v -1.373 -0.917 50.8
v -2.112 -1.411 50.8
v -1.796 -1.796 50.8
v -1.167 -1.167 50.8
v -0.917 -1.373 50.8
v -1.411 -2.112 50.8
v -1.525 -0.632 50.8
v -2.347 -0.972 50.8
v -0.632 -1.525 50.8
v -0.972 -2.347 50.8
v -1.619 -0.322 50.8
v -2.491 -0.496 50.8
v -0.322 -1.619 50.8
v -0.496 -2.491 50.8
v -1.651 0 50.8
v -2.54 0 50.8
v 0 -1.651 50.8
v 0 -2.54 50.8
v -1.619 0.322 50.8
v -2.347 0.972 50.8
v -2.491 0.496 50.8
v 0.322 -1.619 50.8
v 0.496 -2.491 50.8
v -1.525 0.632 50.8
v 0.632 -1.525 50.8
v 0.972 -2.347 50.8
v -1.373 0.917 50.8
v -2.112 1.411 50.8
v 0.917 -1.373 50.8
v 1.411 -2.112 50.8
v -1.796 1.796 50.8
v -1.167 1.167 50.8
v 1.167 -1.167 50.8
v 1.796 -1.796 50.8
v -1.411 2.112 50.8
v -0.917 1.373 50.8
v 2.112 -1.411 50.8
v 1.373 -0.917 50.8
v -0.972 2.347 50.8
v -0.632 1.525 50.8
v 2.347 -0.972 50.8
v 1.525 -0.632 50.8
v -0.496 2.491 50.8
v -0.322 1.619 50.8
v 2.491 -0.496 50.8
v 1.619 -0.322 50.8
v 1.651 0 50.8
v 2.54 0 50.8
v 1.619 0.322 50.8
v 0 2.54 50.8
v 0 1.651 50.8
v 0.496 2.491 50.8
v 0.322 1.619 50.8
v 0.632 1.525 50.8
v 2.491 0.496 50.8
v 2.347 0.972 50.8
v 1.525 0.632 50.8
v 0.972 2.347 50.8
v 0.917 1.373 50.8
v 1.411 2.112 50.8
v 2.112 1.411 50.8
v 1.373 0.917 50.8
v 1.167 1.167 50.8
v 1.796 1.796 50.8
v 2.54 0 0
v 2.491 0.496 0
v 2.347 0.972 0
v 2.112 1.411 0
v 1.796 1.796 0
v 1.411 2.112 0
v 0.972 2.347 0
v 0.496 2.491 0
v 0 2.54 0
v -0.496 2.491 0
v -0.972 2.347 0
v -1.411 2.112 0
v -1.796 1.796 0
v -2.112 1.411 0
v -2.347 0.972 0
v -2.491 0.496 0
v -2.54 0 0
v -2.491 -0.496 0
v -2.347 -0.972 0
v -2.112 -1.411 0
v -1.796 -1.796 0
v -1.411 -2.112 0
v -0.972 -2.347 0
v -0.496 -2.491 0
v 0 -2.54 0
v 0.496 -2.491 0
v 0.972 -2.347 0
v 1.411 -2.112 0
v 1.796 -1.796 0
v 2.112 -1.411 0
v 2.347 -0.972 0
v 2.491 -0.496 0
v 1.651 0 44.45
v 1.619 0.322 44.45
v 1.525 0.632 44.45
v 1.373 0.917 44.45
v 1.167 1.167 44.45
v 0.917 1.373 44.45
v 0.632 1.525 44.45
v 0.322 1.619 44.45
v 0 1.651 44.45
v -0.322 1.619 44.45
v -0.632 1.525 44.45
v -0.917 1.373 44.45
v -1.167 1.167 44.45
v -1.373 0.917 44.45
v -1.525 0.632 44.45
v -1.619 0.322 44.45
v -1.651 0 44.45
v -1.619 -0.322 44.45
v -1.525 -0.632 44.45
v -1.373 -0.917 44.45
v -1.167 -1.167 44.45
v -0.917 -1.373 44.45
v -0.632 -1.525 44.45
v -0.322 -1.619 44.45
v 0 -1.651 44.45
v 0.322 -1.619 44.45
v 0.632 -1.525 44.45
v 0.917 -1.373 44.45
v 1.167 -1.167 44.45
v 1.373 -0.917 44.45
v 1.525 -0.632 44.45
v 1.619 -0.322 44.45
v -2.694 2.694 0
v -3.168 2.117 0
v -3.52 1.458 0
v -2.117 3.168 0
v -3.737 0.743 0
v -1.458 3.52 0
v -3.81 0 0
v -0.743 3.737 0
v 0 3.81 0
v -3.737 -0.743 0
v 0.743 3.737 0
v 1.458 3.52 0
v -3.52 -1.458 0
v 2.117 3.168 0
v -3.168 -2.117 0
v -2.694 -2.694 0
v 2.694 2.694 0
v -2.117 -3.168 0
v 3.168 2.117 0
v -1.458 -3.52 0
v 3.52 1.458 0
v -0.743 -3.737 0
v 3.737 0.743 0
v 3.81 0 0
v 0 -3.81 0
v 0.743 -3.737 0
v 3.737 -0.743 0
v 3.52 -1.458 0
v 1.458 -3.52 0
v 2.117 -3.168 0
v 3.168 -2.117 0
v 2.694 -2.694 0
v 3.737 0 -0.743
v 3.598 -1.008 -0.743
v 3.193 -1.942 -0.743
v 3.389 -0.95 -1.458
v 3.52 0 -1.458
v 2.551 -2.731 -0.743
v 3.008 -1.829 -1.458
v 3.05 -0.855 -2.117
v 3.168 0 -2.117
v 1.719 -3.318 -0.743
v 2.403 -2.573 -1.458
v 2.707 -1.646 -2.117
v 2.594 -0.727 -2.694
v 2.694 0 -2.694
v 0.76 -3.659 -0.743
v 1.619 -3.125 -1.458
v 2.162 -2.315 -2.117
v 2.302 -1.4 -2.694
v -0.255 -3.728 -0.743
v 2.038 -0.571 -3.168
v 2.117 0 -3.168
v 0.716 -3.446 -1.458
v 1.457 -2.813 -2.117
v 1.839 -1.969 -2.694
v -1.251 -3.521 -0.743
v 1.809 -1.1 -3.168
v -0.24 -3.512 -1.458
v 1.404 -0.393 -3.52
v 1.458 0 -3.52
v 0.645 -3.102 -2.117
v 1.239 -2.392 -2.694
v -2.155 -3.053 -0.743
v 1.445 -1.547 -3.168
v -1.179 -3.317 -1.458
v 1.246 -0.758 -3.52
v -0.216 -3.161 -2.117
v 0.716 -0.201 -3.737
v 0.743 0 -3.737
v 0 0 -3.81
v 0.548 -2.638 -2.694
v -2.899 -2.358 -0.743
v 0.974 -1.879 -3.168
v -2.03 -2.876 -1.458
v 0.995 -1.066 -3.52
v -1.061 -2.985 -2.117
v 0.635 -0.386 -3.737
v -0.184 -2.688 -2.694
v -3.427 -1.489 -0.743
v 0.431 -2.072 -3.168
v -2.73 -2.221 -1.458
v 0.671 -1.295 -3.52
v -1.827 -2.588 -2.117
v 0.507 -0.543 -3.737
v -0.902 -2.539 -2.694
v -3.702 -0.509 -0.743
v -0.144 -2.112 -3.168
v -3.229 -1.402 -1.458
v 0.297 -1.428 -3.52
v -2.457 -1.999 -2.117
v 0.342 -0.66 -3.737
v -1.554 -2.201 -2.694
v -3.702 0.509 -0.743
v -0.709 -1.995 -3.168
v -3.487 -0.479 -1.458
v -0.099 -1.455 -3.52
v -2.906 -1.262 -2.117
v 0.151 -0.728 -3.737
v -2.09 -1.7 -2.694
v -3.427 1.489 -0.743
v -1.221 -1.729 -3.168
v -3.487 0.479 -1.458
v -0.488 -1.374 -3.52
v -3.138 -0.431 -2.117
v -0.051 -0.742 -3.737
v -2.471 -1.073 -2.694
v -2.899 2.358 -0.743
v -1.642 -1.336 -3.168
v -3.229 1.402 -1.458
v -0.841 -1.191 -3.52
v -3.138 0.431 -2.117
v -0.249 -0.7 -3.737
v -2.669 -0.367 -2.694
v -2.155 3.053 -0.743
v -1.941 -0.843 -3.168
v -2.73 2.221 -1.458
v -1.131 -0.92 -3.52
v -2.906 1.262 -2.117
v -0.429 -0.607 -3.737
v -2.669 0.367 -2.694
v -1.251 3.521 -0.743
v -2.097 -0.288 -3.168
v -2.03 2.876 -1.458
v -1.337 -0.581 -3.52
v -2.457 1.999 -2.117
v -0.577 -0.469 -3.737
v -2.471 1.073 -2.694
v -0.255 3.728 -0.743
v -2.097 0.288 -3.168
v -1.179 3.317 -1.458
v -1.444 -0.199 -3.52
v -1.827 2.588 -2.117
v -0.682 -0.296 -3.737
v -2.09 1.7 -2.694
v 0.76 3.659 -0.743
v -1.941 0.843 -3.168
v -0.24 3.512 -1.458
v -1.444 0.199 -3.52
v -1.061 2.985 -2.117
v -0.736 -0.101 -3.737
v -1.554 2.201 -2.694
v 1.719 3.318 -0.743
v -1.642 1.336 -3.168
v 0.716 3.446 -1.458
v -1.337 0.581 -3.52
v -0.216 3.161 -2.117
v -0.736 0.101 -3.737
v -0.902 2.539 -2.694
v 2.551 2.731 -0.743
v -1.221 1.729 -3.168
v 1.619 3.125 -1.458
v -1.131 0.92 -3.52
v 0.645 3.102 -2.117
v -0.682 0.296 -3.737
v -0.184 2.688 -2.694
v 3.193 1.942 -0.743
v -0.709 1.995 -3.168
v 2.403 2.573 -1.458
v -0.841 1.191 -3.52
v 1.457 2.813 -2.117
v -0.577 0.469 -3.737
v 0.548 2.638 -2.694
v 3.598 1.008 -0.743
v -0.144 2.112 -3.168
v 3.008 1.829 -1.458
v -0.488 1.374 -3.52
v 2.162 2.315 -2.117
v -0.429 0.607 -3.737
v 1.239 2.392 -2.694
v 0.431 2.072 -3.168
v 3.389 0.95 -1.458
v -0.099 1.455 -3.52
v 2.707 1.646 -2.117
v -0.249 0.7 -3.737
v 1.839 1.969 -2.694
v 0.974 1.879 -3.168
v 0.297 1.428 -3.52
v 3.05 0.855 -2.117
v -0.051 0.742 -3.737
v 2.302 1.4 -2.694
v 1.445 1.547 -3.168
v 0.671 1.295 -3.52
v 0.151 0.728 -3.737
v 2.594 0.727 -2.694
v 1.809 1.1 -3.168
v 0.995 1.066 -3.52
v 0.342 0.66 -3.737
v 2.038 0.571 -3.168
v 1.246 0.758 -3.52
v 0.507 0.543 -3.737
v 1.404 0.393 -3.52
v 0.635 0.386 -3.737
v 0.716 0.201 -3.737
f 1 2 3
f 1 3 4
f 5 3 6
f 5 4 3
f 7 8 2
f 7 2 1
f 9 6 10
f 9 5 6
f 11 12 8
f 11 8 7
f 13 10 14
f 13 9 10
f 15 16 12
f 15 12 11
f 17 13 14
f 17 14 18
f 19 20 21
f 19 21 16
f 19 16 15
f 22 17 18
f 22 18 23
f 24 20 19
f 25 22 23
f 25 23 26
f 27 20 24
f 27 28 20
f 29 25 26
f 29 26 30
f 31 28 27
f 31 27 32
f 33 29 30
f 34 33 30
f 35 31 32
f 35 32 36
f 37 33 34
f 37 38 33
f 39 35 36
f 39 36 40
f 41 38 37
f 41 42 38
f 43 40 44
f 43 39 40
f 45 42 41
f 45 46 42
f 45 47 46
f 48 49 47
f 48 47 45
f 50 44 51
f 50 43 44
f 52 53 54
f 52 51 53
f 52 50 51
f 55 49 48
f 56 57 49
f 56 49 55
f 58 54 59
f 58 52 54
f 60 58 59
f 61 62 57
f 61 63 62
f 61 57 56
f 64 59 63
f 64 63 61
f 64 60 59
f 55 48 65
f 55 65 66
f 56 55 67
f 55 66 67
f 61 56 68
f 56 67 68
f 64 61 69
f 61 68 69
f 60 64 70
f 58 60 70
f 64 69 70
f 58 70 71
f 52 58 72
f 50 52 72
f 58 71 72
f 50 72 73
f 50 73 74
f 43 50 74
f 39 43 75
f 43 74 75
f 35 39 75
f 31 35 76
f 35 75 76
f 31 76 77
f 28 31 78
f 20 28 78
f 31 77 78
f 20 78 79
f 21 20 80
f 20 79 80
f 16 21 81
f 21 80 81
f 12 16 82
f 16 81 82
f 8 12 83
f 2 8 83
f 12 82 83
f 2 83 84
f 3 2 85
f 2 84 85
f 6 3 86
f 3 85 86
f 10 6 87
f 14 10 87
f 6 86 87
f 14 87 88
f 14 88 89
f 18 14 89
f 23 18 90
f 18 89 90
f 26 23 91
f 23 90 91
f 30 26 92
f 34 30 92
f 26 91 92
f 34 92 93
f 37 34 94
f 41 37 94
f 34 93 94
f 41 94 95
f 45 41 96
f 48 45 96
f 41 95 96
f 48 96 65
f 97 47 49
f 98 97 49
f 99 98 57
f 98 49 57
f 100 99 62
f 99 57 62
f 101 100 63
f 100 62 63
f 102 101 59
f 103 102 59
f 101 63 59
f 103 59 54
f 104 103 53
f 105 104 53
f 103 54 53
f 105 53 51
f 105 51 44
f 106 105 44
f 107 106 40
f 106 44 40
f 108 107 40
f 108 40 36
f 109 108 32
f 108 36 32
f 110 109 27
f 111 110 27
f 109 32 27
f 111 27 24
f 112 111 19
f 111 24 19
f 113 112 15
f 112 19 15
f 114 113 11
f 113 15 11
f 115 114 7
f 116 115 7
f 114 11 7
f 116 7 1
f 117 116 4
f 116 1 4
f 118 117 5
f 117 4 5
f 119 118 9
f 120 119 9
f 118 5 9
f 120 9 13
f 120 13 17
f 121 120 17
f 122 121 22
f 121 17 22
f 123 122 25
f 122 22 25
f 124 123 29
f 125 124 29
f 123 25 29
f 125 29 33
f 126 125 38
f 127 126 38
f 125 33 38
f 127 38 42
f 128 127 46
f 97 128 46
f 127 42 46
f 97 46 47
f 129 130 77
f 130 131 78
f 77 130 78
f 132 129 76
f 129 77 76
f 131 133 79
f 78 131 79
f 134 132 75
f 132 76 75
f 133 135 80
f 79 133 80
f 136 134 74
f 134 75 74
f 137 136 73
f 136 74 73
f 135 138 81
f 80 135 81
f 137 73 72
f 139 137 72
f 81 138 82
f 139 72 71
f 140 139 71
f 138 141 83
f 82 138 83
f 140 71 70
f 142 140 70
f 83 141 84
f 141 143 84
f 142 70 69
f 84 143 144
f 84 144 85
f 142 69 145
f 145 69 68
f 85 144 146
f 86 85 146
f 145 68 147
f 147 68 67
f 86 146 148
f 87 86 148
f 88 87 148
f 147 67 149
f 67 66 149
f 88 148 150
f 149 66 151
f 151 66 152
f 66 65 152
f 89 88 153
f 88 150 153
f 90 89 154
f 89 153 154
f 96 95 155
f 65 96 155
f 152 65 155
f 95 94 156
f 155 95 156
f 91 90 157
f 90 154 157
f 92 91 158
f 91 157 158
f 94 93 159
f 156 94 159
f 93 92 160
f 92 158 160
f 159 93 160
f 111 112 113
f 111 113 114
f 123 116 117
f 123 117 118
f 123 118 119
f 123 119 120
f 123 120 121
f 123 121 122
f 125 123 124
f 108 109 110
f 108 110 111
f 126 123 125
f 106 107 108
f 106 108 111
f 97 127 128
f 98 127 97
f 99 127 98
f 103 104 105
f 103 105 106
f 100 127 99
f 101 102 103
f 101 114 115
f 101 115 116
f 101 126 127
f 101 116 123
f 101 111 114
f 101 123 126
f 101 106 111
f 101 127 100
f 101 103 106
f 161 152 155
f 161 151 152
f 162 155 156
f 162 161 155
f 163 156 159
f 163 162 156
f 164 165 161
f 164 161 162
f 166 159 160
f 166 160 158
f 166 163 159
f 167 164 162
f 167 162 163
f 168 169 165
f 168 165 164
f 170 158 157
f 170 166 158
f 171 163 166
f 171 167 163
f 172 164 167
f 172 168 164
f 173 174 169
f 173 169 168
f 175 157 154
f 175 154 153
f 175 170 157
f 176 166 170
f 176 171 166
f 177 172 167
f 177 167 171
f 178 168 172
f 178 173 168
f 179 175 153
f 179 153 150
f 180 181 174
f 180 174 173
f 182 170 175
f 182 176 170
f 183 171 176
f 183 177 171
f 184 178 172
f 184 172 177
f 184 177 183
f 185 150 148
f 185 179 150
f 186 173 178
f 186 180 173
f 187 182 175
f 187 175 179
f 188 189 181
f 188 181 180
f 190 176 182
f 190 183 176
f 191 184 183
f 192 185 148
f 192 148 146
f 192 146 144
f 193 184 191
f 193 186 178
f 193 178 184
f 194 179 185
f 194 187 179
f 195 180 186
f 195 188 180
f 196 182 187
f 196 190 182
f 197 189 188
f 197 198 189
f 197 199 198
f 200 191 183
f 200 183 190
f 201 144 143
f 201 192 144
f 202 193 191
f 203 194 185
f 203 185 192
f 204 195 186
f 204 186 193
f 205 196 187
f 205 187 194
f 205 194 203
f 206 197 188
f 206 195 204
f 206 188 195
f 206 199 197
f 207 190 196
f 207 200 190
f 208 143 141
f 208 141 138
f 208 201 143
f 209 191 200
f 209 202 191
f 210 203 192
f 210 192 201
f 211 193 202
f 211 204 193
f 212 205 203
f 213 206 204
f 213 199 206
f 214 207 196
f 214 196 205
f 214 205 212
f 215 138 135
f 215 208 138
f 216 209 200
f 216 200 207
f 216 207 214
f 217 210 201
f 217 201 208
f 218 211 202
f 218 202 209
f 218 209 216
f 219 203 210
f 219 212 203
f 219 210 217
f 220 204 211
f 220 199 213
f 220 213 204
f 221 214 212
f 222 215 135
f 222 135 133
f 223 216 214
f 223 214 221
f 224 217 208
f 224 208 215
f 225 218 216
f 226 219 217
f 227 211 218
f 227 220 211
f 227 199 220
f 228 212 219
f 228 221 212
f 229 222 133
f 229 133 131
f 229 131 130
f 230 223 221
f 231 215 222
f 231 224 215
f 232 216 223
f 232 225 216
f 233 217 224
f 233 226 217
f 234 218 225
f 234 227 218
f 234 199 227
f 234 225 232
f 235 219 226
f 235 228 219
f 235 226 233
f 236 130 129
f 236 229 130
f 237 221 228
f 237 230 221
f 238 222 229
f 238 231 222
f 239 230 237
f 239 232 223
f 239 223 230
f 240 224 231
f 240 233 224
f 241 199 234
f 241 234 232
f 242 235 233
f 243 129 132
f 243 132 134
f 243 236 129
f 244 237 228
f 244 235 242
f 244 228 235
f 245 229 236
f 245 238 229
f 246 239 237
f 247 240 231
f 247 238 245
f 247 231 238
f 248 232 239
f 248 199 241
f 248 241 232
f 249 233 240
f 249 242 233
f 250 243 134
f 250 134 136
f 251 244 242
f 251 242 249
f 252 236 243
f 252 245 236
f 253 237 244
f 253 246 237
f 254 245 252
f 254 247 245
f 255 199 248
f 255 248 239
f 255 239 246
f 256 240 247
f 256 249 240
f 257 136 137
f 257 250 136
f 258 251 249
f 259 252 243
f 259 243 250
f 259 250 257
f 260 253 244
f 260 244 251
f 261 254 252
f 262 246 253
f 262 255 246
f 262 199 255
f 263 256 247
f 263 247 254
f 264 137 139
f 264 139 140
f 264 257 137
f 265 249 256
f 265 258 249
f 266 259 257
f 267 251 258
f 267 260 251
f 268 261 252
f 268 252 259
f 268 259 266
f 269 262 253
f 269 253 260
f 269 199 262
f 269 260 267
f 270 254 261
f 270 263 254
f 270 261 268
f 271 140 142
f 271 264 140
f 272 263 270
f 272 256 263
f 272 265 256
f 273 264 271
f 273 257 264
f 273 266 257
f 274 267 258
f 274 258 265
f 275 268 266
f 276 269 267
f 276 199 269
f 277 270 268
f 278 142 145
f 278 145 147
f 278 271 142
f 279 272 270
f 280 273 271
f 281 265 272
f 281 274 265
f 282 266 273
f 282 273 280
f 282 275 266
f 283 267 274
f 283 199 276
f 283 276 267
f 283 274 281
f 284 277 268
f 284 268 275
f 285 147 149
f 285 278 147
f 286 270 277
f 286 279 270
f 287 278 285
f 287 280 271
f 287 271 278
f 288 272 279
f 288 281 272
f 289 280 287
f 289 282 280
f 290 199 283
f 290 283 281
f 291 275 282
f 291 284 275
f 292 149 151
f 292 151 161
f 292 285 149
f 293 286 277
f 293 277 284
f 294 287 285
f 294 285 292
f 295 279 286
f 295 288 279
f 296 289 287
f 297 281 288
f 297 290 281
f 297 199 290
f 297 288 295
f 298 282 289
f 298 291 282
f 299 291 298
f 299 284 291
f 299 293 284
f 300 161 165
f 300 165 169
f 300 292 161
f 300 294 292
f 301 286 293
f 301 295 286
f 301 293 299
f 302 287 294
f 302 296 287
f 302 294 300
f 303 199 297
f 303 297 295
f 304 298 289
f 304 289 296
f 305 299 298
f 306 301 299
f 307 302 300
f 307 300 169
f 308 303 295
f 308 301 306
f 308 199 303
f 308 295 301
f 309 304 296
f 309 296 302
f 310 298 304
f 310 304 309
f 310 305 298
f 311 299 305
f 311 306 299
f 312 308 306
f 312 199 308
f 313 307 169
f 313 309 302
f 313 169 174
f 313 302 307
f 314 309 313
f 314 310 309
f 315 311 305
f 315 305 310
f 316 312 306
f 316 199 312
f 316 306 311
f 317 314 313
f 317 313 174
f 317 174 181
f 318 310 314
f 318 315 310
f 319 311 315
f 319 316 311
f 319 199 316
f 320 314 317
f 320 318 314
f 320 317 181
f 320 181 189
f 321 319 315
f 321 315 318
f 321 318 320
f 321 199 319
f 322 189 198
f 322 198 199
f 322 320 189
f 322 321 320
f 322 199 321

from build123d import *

# Parameters (mm, degrees)
F0_R     = 2.54
F1_DEPTH = 50.8
F3_R     = 1.651
F4_DEPTH = 6.35
F5_R     = 3.81
F6_DEPTH = 3.81
F7_R     = 3.80999


# Not quite as in the source:
# - a fillet or chamfer is up to 0.001 mm smaller than in the source, because OpenCascade refuses the exact size


with BuildPart() as f1:
    # F0 (on Top) → F1 (new body)
    with BuildSketch(Plane.XY):
        Circle(F0_R)
    extrude(amount=F1_DEPTH)

    # F3 (on face) → F4 (cut)
    with BuildSketch(Plane.XY.offset(50.8)):
        Circle(F3_R)
    extrude(amount=-F4_DEPTH, mode=Mode.SUBTRACT)

    # F5 (on face) → F6 (join)
    with BuildSketch(Plane(origin=(0, 0, 0), x_dir=(1, 0, 0), z_dir=(0, 0, -1))):
        Circle(F5_R)
    extrude(amount=F6_DEPTH)

    # F7 (radius 3.81 in the source; OpenCascade refuses exactly that, so slightly less here)
    f7_edges = [f1.edges().sort_by_distance(p)[0] for p in [
        (-3.81, 0, -3.81),
    ]]
    fillet(f7_edges, radius=F7_R)


solid = f1.part
